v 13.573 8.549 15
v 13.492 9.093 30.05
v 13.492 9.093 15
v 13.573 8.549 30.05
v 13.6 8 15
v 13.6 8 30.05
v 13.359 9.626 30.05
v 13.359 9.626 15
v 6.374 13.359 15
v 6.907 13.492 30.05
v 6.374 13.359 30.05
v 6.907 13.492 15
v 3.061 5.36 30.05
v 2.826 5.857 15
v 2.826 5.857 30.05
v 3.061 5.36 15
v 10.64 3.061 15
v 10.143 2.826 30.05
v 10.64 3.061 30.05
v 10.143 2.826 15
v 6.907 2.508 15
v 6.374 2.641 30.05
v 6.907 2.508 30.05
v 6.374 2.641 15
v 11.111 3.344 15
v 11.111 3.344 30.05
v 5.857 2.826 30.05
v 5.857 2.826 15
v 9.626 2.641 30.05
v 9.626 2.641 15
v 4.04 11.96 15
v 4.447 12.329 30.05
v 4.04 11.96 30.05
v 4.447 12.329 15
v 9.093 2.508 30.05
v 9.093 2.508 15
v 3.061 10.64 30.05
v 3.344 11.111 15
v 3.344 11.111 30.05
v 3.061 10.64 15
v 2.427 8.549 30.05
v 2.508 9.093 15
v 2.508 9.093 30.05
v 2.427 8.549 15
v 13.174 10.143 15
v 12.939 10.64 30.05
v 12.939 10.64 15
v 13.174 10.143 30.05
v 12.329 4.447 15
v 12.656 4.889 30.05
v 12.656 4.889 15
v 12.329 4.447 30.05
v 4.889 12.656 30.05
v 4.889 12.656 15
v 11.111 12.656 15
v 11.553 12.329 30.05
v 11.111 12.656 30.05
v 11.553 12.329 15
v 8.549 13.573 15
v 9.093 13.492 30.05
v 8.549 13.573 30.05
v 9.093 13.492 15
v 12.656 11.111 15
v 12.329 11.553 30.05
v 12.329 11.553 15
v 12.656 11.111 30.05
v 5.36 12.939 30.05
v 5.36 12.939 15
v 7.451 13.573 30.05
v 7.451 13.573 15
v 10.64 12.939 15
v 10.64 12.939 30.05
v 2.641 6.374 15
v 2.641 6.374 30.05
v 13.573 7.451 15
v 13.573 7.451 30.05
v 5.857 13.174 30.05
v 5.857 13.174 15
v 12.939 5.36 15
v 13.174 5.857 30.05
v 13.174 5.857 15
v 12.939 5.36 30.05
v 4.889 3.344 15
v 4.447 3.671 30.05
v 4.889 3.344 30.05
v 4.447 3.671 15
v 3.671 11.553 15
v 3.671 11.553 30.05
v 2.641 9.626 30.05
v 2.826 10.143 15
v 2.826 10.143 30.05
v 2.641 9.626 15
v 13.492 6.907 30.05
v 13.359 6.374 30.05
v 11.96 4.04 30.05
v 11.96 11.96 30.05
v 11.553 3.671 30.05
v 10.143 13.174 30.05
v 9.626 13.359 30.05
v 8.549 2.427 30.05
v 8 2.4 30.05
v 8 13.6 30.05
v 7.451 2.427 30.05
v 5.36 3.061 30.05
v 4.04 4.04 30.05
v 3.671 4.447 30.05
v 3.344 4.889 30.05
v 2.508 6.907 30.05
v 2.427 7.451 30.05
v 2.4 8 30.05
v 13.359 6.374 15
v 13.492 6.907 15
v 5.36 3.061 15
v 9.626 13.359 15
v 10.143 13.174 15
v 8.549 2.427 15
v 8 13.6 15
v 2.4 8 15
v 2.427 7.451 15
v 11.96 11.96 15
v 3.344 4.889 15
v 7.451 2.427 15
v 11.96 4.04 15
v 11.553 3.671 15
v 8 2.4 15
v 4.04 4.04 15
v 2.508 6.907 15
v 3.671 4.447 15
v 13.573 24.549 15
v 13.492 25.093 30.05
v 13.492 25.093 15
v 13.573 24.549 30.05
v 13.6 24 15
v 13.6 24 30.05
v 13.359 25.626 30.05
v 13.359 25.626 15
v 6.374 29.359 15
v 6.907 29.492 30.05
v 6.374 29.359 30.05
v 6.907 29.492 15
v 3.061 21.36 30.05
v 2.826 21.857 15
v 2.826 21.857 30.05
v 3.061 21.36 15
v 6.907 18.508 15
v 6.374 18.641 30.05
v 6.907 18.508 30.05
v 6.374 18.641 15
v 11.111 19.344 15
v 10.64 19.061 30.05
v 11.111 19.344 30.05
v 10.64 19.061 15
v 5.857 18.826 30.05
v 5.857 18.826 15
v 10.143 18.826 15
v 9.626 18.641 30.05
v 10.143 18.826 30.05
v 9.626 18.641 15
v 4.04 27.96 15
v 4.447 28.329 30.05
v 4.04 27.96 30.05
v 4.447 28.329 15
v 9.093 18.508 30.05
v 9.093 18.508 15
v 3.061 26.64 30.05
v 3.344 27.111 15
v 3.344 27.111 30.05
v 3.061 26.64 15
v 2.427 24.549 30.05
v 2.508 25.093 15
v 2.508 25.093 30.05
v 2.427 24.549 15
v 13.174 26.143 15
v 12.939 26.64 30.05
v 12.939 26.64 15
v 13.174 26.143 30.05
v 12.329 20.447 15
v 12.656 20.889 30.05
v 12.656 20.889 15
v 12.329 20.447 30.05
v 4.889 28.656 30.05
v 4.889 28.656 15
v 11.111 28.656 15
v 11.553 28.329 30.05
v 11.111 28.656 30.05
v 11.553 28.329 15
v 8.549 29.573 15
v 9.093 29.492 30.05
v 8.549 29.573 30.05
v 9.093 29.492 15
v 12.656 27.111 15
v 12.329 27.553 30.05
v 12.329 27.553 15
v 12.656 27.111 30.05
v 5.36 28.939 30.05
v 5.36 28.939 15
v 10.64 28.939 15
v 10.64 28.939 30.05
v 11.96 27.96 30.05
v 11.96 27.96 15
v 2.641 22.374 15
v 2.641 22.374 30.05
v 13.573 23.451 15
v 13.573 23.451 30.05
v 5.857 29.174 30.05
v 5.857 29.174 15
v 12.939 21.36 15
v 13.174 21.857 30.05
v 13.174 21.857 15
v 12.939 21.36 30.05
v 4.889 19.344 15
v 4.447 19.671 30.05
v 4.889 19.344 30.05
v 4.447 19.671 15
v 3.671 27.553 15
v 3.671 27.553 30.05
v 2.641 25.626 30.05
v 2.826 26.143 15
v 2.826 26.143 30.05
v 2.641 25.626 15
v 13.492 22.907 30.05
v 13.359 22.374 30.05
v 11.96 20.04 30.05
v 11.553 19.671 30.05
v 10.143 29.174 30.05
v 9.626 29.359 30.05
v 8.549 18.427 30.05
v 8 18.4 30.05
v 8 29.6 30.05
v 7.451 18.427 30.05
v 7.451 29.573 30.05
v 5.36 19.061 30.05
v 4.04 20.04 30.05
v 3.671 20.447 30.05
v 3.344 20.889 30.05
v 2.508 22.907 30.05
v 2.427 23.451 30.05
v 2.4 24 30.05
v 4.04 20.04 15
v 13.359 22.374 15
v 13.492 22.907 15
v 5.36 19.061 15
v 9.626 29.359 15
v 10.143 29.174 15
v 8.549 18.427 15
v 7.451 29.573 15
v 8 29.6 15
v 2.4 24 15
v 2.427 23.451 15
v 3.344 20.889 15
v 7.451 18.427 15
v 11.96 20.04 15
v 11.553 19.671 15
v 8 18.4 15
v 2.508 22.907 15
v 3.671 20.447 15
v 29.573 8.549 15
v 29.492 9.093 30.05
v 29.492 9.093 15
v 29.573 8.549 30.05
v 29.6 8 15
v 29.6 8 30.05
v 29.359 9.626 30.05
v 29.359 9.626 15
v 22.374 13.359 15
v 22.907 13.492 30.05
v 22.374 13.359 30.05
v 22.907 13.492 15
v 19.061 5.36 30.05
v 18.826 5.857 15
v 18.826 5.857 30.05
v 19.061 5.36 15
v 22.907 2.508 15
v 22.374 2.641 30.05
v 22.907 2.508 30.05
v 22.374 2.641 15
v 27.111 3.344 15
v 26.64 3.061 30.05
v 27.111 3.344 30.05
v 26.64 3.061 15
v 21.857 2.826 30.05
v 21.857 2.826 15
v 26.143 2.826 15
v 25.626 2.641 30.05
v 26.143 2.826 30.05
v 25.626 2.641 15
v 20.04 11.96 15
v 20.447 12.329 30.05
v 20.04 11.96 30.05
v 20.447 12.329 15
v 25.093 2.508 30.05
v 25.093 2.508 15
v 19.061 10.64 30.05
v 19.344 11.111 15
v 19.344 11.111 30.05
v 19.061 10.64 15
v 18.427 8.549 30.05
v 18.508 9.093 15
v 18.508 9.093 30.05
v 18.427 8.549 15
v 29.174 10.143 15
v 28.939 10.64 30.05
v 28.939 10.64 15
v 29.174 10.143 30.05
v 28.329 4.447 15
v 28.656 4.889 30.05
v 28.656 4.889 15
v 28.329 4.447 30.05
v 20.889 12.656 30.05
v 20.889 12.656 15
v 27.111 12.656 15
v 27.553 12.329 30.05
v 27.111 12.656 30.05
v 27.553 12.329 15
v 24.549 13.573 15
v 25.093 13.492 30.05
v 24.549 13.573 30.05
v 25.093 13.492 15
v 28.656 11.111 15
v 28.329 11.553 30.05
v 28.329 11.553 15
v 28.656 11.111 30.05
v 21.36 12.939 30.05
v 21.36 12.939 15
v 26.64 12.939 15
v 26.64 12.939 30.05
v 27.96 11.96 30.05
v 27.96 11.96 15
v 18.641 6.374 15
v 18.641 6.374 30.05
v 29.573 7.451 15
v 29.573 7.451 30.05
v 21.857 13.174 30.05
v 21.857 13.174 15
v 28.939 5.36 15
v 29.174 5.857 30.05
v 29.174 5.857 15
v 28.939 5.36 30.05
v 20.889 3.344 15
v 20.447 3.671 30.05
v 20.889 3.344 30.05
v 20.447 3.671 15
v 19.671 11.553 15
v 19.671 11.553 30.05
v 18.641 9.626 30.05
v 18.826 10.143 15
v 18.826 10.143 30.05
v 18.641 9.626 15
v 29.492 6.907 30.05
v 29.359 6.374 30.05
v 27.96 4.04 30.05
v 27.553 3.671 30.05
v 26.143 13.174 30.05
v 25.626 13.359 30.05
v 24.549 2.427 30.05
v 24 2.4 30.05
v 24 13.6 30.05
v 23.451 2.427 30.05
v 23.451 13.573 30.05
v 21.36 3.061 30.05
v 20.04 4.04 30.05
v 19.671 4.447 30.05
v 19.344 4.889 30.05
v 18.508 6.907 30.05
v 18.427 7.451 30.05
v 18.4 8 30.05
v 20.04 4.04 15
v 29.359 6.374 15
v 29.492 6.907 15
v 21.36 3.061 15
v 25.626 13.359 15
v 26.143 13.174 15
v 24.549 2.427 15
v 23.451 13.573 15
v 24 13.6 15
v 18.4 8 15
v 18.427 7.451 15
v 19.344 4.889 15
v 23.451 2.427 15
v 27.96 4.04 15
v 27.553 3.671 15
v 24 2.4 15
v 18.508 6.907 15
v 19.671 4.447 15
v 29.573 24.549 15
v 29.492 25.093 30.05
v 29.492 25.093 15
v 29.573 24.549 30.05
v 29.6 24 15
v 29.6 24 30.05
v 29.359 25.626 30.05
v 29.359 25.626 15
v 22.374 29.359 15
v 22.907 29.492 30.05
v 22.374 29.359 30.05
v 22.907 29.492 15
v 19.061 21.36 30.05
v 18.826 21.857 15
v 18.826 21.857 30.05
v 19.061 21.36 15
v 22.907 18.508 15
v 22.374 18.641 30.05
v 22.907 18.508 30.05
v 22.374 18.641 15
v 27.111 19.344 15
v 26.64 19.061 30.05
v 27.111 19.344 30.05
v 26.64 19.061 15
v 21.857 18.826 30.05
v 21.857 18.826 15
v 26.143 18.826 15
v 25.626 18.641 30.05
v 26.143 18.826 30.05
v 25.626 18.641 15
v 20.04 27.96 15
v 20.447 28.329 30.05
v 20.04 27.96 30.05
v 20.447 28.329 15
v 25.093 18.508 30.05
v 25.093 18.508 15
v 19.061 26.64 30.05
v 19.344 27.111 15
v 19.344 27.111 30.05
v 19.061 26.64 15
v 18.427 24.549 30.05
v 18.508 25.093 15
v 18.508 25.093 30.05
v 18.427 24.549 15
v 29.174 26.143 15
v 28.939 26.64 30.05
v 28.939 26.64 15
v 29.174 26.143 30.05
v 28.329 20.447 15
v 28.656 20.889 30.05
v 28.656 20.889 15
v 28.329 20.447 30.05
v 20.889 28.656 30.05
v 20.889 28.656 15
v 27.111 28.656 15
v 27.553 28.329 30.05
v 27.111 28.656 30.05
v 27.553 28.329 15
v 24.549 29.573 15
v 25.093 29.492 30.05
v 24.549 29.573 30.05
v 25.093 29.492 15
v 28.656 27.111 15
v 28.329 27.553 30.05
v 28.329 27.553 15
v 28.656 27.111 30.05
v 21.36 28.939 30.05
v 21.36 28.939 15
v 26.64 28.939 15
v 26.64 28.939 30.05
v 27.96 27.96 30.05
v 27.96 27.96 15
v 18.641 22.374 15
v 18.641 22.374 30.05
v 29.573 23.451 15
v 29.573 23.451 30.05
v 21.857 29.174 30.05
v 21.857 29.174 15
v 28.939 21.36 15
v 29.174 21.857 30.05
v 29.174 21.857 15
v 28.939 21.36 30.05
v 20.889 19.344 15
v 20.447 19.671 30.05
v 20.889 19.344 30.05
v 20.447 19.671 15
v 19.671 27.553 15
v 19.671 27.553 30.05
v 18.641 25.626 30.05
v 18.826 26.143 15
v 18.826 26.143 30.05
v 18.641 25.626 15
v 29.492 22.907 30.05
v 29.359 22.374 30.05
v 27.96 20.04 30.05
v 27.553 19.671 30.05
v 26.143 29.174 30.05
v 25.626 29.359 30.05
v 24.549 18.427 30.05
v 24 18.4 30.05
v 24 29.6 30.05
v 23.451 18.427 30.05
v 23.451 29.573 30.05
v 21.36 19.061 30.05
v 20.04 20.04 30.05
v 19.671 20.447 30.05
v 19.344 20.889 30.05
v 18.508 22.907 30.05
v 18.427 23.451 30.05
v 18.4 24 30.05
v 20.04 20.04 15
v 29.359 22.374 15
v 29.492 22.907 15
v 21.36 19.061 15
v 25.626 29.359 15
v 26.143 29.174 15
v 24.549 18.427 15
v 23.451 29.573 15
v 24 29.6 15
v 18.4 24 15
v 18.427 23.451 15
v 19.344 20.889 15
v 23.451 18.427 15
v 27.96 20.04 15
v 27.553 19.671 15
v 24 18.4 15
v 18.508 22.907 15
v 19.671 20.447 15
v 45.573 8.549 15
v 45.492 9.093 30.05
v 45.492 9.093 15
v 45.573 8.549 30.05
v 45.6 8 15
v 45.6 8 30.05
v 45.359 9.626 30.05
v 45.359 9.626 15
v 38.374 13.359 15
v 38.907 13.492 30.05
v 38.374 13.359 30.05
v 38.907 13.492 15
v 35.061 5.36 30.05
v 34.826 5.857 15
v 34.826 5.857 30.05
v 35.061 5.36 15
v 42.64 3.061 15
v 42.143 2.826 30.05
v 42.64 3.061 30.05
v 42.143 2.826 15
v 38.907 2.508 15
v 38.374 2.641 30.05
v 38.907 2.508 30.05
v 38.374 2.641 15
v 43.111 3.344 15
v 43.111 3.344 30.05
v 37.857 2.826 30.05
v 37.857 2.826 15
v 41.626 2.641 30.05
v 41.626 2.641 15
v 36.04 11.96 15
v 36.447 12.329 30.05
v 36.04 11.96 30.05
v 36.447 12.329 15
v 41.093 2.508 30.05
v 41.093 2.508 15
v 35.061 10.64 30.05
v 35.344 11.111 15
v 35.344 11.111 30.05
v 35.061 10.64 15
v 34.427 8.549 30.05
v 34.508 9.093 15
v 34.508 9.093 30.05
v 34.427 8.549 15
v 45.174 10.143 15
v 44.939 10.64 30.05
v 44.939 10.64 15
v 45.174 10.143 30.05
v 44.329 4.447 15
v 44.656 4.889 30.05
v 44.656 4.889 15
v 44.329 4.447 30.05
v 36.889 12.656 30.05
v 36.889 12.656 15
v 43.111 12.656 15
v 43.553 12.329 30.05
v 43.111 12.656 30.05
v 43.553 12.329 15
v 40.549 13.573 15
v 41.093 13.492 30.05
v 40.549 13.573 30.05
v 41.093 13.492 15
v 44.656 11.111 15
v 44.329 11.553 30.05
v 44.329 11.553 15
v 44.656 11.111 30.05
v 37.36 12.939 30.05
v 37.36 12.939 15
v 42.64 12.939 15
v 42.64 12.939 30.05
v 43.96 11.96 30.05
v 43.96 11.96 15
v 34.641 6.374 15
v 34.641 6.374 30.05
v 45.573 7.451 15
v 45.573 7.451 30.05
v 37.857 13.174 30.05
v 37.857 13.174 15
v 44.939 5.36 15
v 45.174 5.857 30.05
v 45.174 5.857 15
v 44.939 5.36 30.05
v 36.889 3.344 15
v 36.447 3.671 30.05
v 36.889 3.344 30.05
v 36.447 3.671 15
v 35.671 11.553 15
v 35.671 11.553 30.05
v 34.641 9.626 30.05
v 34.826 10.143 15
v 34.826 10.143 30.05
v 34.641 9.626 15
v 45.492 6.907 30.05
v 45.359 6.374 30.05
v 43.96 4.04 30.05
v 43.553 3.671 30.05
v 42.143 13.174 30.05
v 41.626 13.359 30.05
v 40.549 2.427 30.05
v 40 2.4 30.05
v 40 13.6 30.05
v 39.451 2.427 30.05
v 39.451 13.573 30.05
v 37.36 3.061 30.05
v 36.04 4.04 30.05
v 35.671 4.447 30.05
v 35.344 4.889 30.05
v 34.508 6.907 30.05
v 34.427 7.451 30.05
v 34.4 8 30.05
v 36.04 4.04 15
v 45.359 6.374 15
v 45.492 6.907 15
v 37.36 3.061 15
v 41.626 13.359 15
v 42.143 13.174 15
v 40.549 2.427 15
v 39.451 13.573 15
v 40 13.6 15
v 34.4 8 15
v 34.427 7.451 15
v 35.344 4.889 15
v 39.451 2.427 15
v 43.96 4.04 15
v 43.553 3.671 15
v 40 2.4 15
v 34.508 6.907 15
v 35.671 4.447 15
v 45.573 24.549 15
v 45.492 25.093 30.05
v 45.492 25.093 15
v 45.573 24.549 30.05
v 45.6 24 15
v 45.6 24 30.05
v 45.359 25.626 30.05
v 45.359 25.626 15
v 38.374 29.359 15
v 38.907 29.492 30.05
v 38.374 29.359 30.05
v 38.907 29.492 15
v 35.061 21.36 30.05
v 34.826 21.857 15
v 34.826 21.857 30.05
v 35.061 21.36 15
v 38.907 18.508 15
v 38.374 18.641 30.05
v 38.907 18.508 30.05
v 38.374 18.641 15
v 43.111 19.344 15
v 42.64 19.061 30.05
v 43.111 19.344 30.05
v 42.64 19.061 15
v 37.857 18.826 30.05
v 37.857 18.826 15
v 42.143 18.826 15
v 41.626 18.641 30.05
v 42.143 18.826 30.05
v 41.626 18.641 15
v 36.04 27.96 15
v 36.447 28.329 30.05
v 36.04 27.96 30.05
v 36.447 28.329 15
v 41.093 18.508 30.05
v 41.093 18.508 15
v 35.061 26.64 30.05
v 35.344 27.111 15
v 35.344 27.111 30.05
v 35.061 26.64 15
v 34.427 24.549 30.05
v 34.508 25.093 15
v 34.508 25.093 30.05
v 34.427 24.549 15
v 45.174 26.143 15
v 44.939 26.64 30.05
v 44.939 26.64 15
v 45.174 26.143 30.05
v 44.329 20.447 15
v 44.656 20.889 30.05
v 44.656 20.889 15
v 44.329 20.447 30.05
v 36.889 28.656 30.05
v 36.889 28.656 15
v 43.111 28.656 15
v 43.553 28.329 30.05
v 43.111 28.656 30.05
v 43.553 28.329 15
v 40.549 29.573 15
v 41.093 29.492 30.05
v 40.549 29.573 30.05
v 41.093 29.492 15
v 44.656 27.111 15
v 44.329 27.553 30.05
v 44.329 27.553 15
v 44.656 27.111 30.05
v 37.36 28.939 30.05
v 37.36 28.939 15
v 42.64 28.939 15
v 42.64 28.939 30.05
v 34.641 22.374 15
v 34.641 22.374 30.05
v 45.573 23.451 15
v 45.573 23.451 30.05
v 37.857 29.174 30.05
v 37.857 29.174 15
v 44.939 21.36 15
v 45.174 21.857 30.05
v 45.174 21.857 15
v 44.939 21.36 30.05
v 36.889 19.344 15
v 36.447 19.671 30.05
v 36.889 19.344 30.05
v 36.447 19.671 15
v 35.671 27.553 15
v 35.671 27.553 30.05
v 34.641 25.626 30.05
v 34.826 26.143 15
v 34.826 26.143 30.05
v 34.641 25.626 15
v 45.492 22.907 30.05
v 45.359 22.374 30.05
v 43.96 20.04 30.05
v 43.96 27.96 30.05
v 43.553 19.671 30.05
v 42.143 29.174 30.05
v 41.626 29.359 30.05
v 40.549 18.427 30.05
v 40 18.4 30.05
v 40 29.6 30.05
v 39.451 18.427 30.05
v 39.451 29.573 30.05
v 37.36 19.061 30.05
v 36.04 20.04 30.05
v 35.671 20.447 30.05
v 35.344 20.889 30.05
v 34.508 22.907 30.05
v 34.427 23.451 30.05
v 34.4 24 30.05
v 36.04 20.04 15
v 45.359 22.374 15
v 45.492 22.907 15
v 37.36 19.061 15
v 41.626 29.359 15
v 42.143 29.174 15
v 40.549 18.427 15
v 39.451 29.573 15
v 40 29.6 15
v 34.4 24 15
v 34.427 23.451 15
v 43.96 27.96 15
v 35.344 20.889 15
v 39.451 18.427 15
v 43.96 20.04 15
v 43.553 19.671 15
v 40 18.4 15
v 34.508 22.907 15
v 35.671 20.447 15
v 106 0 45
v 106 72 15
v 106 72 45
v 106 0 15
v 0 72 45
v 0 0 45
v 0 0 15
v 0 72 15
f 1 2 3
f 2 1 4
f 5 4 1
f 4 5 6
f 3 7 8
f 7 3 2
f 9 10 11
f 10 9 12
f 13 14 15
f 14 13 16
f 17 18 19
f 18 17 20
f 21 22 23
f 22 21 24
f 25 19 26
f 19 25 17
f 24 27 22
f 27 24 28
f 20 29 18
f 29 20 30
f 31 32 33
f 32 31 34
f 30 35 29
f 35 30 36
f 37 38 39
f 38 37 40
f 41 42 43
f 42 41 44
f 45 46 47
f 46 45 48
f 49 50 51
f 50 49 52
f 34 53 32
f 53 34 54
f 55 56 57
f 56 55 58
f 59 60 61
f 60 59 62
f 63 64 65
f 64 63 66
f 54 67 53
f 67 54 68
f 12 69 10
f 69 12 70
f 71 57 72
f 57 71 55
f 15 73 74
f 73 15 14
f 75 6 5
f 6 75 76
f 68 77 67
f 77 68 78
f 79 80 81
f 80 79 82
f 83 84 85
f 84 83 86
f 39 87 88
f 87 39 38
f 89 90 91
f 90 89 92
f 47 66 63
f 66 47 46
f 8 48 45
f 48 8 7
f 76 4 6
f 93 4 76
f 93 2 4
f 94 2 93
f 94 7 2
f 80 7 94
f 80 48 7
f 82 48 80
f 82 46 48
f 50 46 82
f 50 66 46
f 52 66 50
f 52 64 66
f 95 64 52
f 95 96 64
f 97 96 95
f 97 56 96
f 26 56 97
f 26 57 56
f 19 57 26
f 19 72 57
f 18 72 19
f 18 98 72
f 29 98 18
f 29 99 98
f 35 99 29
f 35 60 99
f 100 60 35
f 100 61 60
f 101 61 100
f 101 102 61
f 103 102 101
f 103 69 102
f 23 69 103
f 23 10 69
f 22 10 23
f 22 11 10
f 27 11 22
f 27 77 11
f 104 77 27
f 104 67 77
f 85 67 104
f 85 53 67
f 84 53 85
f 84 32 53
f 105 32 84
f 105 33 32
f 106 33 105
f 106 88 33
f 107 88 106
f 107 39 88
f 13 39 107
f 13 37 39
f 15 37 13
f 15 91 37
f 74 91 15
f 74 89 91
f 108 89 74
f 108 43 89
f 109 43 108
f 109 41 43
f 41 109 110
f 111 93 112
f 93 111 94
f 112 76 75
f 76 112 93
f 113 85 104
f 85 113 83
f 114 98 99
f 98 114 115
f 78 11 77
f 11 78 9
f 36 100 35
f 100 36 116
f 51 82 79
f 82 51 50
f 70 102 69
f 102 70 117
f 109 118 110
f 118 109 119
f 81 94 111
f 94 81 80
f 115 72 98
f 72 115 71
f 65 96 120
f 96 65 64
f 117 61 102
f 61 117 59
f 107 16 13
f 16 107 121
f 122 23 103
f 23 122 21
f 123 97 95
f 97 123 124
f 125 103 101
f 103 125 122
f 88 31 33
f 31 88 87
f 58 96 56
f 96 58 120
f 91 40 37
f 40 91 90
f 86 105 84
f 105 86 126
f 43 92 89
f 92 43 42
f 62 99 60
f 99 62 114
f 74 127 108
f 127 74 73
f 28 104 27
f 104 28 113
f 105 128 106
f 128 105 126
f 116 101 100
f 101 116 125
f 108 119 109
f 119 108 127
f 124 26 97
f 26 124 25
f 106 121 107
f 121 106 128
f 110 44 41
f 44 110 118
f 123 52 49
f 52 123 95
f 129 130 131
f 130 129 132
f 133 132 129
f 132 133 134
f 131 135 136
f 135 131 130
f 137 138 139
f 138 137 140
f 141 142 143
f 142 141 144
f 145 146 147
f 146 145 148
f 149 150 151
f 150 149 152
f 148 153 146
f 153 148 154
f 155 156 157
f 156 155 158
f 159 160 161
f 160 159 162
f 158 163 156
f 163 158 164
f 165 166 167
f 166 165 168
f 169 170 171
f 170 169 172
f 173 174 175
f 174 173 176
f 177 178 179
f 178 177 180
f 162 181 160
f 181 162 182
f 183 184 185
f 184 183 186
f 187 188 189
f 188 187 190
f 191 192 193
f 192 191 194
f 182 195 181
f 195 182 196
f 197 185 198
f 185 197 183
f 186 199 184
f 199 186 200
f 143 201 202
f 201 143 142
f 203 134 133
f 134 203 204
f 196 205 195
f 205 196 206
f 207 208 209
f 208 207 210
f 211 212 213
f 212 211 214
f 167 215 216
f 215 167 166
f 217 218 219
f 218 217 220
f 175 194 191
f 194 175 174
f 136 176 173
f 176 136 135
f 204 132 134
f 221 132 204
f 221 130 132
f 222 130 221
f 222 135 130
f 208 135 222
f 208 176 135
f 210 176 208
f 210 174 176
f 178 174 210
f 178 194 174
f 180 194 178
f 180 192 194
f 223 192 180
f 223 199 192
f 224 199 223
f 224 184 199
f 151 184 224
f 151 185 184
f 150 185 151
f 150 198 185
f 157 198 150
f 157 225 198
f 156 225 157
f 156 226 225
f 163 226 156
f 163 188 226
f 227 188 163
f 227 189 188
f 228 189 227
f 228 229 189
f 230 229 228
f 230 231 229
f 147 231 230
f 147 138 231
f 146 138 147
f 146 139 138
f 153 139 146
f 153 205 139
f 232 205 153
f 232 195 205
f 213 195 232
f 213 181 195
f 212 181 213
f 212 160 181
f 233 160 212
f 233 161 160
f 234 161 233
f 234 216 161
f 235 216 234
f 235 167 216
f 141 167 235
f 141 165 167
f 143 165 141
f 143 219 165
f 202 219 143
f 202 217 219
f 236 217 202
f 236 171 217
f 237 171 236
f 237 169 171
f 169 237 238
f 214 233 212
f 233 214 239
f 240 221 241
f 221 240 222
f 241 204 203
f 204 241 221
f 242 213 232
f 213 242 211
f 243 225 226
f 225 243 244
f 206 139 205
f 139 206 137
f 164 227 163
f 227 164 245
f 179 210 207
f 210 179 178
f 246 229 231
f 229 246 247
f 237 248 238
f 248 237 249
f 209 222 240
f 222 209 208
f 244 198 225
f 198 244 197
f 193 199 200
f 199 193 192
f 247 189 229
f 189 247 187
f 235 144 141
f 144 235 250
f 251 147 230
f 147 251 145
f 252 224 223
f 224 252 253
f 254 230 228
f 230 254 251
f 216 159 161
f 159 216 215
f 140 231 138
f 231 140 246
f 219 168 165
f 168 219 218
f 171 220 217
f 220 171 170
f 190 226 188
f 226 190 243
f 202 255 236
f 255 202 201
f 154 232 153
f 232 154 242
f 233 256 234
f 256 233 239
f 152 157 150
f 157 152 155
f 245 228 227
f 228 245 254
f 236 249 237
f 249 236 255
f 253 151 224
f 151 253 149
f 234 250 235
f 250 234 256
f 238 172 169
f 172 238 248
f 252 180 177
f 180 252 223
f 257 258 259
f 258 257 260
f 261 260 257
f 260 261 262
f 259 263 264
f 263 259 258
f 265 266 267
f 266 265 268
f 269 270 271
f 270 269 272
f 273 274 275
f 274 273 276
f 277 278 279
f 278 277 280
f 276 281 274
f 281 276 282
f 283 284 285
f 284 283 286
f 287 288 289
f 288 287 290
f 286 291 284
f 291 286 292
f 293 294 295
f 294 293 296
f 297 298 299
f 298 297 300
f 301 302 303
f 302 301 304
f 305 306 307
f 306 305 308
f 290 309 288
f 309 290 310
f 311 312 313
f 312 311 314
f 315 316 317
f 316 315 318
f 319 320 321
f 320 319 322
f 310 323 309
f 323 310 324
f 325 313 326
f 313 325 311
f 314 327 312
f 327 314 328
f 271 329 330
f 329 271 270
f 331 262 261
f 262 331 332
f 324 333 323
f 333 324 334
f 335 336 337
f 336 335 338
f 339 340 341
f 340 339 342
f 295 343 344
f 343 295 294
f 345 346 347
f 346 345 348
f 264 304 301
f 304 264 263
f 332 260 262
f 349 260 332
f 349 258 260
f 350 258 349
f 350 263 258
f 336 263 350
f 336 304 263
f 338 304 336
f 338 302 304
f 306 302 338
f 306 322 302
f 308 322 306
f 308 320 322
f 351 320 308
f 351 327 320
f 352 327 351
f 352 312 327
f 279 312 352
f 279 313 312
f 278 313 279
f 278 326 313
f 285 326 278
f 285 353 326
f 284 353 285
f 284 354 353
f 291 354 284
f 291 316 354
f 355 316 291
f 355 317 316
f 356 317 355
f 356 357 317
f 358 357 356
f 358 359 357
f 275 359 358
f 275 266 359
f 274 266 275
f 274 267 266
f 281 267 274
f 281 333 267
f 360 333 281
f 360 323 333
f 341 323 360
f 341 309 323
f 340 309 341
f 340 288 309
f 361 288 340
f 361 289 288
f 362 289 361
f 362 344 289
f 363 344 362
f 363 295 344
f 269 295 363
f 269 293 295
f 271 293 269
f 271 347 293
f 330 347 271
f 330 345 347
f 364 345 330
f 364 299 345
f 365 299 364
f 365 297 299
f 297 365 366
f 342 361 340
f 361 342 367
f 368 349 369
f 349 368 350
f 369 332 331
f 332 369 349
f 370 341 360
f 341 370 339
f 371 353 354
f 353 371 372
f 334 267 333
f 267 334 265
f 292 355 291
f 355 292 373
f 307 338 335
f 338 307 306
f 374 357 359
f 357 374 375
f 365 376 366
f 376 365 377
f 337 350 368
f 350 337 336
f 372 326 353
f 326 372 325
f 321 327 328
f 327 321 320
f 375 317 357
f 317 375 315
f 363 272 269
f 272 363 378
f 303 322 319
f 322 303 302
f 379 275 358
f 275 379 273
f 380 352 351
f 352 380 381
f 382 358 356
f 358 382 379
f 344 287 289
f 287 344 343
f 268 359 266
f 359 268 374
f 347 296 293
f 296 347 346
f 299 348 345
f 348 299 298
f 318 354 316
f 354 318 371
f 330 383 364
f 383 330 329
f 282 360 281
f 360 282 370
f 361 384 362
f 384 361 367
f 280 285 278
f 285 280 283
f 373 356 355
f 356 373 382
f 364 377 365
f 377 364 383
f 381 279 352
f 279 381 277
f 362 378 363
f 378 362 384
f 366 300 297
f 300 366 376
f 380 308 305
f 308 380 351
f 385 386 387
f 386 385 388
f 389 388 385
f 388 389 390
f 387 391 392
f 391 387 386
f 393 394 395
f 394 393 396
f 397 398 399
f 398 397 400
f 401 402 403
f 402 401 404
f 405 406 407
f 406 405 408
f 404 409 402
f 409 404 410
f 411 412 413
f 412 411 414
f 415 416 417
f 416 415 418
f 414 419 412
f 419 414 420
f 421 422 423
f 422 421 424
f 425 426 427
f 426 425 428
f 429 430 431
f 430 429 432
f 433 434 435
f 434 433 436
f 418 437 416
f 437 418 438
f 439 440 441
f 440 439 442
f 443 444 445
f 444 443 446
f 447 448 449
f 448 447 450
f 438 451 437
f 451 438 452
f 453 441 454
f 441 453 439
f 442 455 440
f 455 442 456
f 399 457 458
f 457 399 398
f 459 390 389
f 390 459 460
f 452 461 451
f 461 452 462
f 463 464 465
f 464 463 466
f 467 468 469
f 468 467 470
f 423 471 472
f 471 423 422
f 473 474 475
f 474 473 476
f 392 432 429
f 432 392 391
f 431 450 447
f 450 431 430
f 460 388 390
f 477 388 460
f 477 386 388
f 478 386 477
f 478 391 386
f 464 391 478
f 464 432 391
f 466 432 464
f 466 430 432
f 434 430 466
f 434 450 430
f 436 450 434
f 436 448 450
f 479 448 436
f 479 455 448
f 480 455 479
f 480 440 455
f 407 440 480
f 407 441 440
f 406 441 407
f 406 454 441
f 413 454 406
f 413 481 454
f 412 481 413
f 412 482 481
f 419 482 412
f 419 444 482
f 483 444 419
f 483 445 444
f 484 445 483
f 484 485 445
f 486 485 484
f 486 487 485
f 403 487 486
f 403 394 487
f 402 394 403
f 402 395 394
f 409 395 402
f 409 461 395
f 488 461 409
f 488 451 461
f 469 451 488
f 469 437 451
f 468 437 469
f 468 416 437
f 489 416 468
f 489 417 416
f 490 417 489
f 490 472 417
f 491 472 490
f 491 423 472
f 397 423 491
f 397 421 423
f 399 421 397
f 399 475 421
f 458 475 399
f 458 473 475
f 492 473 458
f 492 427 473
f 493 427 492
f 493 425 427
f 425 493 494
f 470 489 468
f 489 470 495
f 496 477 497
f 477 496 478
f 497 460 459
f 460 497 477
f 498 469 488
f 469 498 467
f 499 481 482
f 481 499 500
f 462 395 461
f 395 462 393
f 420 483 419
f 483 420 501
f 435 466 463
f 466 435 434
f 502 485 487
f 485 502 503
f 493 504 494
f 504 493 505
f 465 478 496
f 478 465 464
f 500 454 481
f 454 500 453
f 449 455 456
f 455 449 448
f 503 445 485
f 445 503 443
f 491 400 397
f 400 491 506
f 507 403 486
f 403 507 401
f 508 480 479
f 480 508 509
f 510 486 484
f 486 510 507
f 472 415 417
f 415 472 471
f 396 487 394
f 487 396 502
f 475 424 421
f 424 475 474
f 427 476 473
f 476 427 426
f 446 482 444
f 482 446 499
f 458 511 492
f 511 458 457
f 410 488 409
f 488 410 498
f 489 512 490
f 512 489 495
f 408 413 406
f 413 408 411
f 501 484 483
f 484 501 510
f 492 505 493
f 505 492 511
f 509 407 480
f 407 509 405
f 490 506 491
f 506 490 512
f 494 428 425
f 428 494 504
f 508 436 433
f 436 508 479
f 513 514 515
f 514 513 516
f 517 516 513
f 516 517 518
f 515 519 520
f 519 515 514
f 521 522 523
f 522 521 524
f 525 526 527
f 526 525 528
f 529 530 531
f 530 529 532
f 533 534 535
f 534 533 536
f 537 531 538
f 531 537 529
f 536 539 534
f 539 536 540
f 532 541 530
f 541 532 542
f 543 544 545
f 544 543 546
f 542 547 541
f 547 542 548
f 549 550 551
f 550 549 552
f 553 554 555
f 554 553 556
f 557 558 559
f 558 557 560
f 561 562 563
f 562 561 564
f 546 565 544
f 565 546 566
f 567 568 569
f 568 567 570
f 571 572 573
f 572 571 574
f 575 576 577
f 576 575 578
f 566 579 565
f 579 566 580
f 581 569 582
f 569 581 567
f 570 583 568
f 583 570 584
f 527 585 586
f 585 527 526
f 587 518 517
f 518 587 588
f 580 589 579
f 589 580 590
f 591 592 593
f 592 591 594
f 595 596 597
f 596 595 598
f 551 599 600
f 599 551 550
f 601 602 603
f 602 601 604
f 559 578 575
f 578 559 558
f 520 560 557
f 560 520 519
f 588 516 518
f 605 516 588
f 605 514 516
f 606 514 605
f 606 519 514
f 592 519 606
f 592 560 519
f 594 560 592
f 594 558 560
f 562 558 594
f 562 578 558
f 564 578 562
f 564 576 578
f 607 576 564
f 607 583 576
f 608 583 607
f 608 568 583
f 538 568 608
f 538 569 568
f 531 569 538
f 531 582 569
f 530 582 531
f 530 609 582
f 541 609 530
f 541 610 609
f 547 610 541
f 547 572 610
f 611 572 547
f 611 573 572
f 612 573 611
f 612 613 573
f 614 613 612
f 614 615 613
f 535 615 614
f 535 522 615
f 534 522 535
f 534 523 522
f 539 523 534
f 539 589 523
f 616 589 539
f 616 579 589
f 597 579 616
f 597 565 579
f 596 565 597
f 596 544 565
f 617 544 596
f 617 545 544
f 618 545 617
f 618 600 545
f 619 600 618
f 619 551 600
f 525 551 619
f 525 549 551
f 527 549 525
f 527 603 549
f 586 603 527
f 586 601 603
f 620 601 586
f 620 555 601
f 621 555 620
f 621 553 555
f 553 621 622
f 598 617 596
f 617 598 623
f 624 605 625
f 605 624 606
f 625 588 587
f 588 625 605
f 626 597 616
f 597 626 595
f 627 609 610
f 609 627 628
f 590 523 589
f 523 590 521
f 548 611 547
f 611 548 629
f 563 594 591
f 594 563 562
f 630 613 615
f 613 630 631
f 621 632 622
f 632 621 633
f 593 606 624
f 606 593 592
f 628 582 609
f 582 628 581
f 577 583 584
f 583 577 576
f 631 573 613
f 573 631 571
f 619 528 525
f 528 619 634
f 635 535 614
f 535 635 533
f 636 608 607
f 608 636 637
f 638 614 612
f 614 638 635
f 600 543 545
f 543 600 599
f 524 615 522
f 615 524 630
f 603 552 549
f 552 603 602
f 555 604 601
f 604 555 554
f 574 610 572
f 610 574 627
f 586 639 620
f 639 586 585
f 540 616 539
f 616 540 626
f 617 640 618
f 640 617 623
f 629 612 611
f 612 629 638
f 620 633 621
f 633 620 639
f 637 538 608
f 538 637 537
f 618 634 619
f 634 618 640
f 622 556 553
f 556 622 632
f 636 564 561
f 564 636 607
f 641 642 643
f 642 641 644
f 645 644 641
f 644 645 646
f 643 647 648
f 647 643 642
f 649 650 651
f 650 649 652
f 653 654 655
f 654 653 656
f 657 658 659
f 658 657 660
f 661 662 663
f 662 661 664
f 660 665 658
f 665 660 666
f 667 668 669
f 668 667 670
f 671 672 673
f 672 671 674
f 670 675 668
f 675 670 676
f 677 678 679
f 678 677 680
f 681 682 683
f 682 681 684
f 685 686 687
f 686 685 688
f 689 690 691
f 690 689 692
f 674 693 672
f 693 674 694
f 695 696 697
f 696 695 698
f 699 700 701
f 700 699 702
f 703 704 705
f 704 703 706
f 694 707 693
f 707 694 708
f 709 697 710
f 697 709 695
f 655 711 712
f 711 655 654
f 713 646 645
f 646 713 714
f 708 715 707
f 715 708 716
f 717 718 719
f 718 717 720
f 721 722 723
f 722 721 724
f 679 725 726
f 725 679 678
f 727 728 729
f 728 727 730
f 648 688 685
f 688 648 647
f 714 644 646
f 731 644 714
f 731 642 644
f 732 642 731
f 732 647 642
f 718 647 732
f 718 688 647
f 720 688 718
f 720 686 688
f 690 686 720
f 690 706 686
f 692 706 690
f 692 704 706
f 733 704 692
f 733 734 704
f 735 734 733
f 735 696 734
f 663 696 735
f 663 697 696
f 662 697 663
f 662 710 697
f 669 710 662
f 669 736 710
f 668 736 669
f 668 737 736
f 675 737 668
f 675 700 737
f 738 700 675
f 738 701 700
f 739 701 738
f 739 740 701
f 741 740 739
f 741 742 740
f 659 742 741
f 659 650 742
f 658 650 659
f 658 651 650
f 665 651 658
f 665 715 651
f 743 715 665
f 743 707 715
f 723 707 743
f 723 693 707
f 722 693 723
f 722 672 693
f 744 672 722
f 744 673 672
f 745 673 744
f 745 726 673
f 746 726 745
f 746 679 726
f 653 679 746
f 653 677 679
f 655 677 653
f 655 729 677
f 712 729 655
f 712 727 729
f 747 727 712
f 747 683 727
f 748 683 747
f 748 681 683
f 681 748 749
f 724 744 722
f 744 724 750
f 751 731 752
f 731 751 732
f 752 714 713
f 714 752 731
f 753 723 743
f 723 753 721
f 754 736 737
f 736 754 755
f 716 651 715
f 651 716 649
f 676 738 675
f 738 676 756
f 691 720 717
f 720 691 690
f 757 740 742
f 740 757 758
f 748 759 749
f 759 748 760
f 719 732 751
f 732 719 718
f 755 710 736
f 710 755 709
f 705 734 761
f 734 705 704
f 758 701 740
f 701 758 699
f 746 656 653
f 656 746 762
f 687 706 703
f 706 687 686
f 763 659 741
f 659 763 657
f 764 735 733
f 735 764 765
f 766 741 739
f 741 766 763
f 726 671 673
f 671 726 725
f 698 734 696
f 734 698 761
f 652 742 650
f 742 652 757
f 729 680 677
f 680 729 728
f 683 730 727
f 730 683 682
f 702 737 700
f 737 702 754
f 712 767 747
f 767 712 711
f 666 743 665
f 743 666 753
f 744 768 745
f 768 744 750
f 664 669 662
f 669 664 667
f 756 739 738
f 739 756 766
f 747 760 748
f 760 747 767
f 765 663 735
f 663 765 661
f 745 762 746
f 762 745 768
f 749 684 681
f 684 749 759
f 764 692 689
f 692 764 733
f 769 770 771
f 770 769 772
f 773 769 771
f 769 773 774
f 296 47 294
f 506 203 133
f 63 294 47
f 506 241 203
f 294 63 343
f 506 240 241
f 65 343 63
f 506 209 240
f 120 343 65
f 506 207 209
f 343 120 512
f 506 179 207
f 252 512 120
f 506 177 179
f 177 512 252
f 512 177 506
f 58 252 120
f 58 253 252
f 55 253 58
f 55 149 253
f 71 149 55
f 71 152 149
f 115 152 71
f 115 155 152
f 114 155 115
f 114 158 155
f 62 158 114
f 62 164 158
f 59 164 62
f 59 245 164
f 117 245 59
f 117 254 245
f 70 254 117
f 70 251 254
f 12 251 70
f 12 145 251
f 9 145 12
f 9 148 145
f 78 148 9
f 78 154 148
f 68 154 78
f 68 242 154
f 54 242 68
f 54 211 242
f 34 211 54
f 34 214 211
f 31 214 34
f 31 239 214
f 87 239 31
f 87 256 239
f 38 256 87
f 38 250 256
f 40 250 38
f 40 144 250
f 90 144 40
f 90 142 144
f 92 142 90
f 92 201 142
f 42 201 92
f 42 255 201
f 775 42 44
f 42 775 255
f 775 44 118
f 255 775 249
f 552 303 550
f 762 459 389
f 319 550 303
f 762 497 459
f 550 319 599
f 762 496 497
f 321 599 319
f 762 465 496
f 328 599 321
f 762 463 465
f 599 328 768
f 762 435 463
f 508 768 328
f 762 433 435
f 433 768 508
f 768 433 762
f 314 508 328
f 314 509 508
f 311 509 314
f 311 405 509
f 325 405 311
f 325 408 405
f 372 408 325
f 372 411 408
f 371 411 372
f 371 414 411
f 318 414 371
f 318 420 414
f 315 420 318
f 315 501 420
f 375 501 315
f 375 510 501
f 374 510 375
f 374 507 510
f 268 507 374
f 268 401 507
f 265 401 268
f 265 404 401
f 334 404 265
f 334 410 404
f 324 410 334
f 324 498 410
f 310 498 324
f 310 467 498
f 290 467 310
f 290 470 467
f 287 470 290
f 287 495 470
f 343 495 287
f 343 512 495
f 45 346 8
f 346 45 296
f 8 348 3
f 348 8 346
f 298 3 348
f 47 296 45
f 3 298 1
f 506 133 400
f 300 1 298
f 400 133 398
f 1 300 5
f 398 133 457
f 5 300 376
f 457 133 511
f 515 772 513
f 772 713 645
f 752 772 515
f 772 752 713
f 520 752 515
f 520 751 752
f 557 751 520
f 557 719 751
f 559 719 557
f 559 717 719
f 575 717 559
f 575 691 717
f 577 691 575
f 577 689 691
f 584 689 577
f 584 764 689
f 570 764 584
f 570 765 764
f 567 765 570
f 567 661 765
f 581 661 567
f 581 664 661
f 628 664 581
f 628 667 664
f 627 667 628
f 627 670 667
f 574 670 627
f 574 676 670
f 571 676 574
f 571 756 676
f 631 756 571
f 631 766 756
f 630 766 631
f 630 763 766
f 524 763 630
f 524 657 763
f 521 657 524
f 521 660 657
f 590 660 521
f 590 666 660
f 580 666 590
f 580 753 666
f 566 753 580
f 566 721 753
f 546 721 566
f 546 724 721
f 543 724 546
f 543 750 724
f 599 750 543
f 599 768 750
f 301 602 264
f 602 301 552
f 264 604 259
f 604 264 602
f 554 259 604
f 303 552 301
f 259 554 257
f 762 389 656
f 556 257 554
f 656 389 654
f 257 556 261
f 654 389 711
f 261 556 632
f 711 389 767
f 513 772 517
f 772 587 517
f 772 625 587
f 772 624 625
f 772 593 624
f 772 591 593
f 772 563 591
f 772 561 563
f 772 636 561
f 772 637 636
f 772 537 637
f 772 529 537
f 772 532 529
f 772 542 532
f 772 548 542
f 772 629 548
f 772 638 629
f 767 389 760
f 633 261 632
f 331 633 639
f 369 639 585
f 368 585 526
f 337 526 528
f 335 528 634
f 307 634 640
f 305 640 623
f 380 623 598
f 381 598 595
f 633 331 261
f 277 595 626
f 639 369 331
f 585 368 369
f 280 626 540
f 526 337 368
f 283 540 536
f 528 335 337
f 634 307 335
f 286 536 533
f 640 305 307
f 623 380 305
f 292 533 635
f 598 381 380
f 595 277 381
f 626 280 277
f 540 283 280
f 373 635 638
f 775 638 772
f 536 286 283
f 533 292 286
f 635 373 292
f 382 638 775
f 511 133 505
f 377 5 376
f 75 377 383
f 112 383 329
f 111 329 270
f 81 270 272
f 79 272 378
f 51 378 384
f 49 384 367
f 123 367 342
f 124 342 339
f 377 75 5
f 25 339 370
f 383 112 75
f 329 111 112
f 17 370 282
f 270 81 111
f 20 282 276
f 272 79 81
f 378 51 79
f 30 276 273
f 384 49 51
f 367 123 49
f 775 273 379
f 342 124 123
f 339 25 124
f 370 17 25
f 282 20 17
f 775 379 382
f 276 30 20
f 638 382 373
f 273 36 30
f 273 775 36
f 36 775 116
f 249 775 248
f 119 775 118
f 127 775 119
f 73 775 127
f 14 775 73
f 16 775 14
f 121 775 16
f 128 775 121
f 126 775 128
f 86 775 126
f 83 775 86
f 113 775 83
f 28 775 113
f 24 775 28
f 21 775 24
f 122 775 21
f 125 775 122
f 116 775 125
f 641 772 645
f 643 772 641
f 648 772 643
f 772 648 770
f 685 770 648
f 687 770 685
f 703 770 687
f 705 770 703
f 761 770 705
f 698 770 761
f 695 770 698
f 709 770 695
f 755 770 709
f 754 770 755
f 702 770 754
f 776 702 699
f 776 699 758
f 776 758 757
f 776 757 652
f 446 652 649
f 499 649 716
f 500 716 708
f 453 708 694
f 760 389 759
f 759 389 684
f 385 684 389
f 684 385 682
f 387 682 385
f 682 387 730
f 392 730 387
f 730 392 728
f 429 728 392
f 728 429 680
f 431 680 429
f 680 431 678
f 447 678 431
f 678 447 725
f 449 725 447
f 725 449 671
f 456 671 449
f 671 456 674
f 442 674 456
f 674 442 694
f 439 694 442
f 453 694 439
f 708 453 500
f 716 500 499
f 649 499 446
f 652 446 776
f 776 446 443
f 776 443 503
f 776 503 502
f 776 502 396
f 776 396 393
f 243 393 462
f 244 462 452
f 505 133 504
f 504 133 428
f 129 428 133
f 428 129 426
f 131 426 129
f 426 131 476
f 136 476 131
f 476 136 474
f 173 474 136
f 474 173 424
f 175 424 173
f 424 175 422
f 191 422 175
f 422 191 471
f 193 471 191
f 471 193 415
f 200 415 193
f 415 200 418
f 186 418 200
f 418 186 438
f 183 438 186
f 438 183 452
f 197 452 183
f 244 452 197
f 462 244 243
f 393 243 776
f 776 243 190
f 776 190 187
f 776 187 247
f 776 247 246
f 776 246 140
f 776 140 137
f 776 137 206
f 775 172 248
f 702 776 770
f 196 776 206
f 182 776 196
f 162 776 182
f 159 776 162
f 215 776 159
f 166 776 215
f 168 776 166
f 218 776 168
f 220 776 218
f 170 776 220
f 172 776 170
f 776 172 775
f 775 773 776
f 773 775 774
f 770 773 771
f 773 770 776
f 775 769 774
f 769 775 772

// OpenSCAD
// Dimensions for the bench rack
block_len = 106;      // Length of the block along X axis (mm)
block_wid = 72;        // Width of the block along Y axis (mm)
block_h = 30;          // Height of the block along Z axis (mm)

// Hole specifications
hole_dia = 11.2;       // Diameter of the holes (mm)
hole_depth = 25;      // Depth of the holes (mm)
hole_spacing = 16;     // Center-to-center spacing between holes (mm)
hole_cols = 6;         // Number of holes along X axis
hole_rows = 4;         // Number of holes along Y axis

// Calculated offsets and positions
// Center of the hole grid relative to the block center
hole_center_offset_x = (hole_cols - 1) * hole_spacing / 2;
hole_center_offset_y = (hole_rows - 1) * hole_spacing / 2;

// Hole cylinder positioning
// Top of holes at Z=30 (block top)
// Bottom of holes at Z=5 (5mm floor)
// Cylinder needs to extend past both faces by 0.01-1mm
hole_z_start = 5 - 0.05;  // 4.95mm
hole_cyl_height = hole_depth + 0.1;  // 25.1mm

// Set resolution for curved shapes
$fn = 64;

// Main geometry
difference() {
    // The solid base block
    // Centered on X/Y at origin, resting on XY plane (Z=0)
    translate([0, 0, block_h / 2]) {
        cube([block_len, block_wid, block_h]);
    }

    // The holes
    for (i = [0:hole_cols - 1]) {
        for (j = [0:hole_rows - 1]) {
            // Calculate hole center positions
            x_pos = -hole_center_offset_x + i * hole_spacing;
            y_pos = -hole_center_offset_y + j * hole_spacing;

            // Create the hole cylinder
            // Extends slightly past the top face (Z=30) and the bottom face of the hole (Z=5)
            translate([x_pos, y_pos, hole_z_start]) {
                cylinder(h=hole_cyl_height, d=hole_dia, $fn=64);
            }
        }
    }
}
